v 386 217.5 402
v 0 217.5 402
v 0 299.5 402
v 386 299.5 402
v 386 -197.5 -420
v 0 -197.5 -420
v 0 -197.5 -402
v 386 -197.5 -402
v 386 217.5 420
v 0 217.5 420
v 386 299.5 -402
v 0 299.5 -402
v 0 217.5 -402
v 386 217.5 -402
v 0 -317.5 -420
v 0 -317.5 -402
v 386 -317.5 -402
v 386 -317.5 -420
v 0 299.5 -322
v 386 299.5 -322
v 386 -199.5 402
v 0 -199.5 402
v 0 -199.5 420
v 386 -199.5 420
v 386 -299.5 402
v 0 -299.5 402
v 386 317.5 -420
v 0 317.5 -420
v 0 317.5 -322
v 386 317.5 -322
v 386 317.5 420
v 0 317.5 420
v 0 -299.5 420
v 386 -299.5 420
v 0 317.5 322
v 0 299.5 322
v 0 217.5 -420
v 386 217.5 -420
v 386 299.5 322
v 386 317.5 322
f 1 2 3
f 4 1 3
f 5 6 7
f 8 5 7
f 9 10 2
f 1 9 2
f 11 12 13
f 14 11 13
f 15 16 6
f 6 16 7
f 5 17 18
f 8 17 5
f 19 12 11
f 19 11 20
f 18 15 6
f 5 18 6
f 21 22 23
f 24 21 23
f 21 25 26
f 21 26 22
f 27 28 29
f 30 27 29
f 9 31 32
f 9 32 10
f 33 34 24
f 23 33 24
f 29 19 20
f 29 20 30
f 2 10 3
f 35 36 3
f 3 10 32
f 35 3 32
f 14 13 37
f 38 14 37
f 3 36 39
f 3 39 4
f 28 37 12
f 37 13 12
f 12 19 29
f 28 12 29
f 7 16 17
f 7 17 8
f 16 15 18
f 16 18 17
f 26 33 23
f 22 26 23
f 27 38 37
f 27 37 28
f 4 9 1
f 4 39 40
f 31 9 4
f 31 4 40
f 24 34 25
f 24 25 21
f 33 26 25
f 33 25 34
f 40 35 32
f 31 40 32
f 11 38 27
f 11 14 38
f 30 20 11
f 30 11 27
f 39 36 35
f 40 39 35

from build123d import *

# Parameters (mm, degrees)
F0_W     = 18
F0_H     = 80
F0_W_2   = 100
F0_H_2   = 18
F0_W_3   = 120
F1_DEPTH = 386


with BuildPart() as f1:
    # F0 (on Right) → F1 (new body)
    with BuildSketch(Plane.YZ):
        Polygon((317.5, 402), (317.5, 420), (217.5, 420), (217.5, 402), (299.5, 402), align=None)
        with Locations((308.5, 362)):
            Rectangle(F0_W, F0_H)
        with Locations((-249.5, 411)):
            Rectangle(F0_W_2, F0_H_2)
        with Locations((-257.5, -411)):
            Rectangle(F0_W_3, F0_H_2)
        Polygon((217.5, -420), (317.5, -420), (317.5, -402), (299.5, -402), (217.5, -402), align=None)
        with Locations((308.5, -362)):
            Rectangle(F0_W, F0_H)
    extrude(amount=F1_DEPTH)


solid = f1.part
